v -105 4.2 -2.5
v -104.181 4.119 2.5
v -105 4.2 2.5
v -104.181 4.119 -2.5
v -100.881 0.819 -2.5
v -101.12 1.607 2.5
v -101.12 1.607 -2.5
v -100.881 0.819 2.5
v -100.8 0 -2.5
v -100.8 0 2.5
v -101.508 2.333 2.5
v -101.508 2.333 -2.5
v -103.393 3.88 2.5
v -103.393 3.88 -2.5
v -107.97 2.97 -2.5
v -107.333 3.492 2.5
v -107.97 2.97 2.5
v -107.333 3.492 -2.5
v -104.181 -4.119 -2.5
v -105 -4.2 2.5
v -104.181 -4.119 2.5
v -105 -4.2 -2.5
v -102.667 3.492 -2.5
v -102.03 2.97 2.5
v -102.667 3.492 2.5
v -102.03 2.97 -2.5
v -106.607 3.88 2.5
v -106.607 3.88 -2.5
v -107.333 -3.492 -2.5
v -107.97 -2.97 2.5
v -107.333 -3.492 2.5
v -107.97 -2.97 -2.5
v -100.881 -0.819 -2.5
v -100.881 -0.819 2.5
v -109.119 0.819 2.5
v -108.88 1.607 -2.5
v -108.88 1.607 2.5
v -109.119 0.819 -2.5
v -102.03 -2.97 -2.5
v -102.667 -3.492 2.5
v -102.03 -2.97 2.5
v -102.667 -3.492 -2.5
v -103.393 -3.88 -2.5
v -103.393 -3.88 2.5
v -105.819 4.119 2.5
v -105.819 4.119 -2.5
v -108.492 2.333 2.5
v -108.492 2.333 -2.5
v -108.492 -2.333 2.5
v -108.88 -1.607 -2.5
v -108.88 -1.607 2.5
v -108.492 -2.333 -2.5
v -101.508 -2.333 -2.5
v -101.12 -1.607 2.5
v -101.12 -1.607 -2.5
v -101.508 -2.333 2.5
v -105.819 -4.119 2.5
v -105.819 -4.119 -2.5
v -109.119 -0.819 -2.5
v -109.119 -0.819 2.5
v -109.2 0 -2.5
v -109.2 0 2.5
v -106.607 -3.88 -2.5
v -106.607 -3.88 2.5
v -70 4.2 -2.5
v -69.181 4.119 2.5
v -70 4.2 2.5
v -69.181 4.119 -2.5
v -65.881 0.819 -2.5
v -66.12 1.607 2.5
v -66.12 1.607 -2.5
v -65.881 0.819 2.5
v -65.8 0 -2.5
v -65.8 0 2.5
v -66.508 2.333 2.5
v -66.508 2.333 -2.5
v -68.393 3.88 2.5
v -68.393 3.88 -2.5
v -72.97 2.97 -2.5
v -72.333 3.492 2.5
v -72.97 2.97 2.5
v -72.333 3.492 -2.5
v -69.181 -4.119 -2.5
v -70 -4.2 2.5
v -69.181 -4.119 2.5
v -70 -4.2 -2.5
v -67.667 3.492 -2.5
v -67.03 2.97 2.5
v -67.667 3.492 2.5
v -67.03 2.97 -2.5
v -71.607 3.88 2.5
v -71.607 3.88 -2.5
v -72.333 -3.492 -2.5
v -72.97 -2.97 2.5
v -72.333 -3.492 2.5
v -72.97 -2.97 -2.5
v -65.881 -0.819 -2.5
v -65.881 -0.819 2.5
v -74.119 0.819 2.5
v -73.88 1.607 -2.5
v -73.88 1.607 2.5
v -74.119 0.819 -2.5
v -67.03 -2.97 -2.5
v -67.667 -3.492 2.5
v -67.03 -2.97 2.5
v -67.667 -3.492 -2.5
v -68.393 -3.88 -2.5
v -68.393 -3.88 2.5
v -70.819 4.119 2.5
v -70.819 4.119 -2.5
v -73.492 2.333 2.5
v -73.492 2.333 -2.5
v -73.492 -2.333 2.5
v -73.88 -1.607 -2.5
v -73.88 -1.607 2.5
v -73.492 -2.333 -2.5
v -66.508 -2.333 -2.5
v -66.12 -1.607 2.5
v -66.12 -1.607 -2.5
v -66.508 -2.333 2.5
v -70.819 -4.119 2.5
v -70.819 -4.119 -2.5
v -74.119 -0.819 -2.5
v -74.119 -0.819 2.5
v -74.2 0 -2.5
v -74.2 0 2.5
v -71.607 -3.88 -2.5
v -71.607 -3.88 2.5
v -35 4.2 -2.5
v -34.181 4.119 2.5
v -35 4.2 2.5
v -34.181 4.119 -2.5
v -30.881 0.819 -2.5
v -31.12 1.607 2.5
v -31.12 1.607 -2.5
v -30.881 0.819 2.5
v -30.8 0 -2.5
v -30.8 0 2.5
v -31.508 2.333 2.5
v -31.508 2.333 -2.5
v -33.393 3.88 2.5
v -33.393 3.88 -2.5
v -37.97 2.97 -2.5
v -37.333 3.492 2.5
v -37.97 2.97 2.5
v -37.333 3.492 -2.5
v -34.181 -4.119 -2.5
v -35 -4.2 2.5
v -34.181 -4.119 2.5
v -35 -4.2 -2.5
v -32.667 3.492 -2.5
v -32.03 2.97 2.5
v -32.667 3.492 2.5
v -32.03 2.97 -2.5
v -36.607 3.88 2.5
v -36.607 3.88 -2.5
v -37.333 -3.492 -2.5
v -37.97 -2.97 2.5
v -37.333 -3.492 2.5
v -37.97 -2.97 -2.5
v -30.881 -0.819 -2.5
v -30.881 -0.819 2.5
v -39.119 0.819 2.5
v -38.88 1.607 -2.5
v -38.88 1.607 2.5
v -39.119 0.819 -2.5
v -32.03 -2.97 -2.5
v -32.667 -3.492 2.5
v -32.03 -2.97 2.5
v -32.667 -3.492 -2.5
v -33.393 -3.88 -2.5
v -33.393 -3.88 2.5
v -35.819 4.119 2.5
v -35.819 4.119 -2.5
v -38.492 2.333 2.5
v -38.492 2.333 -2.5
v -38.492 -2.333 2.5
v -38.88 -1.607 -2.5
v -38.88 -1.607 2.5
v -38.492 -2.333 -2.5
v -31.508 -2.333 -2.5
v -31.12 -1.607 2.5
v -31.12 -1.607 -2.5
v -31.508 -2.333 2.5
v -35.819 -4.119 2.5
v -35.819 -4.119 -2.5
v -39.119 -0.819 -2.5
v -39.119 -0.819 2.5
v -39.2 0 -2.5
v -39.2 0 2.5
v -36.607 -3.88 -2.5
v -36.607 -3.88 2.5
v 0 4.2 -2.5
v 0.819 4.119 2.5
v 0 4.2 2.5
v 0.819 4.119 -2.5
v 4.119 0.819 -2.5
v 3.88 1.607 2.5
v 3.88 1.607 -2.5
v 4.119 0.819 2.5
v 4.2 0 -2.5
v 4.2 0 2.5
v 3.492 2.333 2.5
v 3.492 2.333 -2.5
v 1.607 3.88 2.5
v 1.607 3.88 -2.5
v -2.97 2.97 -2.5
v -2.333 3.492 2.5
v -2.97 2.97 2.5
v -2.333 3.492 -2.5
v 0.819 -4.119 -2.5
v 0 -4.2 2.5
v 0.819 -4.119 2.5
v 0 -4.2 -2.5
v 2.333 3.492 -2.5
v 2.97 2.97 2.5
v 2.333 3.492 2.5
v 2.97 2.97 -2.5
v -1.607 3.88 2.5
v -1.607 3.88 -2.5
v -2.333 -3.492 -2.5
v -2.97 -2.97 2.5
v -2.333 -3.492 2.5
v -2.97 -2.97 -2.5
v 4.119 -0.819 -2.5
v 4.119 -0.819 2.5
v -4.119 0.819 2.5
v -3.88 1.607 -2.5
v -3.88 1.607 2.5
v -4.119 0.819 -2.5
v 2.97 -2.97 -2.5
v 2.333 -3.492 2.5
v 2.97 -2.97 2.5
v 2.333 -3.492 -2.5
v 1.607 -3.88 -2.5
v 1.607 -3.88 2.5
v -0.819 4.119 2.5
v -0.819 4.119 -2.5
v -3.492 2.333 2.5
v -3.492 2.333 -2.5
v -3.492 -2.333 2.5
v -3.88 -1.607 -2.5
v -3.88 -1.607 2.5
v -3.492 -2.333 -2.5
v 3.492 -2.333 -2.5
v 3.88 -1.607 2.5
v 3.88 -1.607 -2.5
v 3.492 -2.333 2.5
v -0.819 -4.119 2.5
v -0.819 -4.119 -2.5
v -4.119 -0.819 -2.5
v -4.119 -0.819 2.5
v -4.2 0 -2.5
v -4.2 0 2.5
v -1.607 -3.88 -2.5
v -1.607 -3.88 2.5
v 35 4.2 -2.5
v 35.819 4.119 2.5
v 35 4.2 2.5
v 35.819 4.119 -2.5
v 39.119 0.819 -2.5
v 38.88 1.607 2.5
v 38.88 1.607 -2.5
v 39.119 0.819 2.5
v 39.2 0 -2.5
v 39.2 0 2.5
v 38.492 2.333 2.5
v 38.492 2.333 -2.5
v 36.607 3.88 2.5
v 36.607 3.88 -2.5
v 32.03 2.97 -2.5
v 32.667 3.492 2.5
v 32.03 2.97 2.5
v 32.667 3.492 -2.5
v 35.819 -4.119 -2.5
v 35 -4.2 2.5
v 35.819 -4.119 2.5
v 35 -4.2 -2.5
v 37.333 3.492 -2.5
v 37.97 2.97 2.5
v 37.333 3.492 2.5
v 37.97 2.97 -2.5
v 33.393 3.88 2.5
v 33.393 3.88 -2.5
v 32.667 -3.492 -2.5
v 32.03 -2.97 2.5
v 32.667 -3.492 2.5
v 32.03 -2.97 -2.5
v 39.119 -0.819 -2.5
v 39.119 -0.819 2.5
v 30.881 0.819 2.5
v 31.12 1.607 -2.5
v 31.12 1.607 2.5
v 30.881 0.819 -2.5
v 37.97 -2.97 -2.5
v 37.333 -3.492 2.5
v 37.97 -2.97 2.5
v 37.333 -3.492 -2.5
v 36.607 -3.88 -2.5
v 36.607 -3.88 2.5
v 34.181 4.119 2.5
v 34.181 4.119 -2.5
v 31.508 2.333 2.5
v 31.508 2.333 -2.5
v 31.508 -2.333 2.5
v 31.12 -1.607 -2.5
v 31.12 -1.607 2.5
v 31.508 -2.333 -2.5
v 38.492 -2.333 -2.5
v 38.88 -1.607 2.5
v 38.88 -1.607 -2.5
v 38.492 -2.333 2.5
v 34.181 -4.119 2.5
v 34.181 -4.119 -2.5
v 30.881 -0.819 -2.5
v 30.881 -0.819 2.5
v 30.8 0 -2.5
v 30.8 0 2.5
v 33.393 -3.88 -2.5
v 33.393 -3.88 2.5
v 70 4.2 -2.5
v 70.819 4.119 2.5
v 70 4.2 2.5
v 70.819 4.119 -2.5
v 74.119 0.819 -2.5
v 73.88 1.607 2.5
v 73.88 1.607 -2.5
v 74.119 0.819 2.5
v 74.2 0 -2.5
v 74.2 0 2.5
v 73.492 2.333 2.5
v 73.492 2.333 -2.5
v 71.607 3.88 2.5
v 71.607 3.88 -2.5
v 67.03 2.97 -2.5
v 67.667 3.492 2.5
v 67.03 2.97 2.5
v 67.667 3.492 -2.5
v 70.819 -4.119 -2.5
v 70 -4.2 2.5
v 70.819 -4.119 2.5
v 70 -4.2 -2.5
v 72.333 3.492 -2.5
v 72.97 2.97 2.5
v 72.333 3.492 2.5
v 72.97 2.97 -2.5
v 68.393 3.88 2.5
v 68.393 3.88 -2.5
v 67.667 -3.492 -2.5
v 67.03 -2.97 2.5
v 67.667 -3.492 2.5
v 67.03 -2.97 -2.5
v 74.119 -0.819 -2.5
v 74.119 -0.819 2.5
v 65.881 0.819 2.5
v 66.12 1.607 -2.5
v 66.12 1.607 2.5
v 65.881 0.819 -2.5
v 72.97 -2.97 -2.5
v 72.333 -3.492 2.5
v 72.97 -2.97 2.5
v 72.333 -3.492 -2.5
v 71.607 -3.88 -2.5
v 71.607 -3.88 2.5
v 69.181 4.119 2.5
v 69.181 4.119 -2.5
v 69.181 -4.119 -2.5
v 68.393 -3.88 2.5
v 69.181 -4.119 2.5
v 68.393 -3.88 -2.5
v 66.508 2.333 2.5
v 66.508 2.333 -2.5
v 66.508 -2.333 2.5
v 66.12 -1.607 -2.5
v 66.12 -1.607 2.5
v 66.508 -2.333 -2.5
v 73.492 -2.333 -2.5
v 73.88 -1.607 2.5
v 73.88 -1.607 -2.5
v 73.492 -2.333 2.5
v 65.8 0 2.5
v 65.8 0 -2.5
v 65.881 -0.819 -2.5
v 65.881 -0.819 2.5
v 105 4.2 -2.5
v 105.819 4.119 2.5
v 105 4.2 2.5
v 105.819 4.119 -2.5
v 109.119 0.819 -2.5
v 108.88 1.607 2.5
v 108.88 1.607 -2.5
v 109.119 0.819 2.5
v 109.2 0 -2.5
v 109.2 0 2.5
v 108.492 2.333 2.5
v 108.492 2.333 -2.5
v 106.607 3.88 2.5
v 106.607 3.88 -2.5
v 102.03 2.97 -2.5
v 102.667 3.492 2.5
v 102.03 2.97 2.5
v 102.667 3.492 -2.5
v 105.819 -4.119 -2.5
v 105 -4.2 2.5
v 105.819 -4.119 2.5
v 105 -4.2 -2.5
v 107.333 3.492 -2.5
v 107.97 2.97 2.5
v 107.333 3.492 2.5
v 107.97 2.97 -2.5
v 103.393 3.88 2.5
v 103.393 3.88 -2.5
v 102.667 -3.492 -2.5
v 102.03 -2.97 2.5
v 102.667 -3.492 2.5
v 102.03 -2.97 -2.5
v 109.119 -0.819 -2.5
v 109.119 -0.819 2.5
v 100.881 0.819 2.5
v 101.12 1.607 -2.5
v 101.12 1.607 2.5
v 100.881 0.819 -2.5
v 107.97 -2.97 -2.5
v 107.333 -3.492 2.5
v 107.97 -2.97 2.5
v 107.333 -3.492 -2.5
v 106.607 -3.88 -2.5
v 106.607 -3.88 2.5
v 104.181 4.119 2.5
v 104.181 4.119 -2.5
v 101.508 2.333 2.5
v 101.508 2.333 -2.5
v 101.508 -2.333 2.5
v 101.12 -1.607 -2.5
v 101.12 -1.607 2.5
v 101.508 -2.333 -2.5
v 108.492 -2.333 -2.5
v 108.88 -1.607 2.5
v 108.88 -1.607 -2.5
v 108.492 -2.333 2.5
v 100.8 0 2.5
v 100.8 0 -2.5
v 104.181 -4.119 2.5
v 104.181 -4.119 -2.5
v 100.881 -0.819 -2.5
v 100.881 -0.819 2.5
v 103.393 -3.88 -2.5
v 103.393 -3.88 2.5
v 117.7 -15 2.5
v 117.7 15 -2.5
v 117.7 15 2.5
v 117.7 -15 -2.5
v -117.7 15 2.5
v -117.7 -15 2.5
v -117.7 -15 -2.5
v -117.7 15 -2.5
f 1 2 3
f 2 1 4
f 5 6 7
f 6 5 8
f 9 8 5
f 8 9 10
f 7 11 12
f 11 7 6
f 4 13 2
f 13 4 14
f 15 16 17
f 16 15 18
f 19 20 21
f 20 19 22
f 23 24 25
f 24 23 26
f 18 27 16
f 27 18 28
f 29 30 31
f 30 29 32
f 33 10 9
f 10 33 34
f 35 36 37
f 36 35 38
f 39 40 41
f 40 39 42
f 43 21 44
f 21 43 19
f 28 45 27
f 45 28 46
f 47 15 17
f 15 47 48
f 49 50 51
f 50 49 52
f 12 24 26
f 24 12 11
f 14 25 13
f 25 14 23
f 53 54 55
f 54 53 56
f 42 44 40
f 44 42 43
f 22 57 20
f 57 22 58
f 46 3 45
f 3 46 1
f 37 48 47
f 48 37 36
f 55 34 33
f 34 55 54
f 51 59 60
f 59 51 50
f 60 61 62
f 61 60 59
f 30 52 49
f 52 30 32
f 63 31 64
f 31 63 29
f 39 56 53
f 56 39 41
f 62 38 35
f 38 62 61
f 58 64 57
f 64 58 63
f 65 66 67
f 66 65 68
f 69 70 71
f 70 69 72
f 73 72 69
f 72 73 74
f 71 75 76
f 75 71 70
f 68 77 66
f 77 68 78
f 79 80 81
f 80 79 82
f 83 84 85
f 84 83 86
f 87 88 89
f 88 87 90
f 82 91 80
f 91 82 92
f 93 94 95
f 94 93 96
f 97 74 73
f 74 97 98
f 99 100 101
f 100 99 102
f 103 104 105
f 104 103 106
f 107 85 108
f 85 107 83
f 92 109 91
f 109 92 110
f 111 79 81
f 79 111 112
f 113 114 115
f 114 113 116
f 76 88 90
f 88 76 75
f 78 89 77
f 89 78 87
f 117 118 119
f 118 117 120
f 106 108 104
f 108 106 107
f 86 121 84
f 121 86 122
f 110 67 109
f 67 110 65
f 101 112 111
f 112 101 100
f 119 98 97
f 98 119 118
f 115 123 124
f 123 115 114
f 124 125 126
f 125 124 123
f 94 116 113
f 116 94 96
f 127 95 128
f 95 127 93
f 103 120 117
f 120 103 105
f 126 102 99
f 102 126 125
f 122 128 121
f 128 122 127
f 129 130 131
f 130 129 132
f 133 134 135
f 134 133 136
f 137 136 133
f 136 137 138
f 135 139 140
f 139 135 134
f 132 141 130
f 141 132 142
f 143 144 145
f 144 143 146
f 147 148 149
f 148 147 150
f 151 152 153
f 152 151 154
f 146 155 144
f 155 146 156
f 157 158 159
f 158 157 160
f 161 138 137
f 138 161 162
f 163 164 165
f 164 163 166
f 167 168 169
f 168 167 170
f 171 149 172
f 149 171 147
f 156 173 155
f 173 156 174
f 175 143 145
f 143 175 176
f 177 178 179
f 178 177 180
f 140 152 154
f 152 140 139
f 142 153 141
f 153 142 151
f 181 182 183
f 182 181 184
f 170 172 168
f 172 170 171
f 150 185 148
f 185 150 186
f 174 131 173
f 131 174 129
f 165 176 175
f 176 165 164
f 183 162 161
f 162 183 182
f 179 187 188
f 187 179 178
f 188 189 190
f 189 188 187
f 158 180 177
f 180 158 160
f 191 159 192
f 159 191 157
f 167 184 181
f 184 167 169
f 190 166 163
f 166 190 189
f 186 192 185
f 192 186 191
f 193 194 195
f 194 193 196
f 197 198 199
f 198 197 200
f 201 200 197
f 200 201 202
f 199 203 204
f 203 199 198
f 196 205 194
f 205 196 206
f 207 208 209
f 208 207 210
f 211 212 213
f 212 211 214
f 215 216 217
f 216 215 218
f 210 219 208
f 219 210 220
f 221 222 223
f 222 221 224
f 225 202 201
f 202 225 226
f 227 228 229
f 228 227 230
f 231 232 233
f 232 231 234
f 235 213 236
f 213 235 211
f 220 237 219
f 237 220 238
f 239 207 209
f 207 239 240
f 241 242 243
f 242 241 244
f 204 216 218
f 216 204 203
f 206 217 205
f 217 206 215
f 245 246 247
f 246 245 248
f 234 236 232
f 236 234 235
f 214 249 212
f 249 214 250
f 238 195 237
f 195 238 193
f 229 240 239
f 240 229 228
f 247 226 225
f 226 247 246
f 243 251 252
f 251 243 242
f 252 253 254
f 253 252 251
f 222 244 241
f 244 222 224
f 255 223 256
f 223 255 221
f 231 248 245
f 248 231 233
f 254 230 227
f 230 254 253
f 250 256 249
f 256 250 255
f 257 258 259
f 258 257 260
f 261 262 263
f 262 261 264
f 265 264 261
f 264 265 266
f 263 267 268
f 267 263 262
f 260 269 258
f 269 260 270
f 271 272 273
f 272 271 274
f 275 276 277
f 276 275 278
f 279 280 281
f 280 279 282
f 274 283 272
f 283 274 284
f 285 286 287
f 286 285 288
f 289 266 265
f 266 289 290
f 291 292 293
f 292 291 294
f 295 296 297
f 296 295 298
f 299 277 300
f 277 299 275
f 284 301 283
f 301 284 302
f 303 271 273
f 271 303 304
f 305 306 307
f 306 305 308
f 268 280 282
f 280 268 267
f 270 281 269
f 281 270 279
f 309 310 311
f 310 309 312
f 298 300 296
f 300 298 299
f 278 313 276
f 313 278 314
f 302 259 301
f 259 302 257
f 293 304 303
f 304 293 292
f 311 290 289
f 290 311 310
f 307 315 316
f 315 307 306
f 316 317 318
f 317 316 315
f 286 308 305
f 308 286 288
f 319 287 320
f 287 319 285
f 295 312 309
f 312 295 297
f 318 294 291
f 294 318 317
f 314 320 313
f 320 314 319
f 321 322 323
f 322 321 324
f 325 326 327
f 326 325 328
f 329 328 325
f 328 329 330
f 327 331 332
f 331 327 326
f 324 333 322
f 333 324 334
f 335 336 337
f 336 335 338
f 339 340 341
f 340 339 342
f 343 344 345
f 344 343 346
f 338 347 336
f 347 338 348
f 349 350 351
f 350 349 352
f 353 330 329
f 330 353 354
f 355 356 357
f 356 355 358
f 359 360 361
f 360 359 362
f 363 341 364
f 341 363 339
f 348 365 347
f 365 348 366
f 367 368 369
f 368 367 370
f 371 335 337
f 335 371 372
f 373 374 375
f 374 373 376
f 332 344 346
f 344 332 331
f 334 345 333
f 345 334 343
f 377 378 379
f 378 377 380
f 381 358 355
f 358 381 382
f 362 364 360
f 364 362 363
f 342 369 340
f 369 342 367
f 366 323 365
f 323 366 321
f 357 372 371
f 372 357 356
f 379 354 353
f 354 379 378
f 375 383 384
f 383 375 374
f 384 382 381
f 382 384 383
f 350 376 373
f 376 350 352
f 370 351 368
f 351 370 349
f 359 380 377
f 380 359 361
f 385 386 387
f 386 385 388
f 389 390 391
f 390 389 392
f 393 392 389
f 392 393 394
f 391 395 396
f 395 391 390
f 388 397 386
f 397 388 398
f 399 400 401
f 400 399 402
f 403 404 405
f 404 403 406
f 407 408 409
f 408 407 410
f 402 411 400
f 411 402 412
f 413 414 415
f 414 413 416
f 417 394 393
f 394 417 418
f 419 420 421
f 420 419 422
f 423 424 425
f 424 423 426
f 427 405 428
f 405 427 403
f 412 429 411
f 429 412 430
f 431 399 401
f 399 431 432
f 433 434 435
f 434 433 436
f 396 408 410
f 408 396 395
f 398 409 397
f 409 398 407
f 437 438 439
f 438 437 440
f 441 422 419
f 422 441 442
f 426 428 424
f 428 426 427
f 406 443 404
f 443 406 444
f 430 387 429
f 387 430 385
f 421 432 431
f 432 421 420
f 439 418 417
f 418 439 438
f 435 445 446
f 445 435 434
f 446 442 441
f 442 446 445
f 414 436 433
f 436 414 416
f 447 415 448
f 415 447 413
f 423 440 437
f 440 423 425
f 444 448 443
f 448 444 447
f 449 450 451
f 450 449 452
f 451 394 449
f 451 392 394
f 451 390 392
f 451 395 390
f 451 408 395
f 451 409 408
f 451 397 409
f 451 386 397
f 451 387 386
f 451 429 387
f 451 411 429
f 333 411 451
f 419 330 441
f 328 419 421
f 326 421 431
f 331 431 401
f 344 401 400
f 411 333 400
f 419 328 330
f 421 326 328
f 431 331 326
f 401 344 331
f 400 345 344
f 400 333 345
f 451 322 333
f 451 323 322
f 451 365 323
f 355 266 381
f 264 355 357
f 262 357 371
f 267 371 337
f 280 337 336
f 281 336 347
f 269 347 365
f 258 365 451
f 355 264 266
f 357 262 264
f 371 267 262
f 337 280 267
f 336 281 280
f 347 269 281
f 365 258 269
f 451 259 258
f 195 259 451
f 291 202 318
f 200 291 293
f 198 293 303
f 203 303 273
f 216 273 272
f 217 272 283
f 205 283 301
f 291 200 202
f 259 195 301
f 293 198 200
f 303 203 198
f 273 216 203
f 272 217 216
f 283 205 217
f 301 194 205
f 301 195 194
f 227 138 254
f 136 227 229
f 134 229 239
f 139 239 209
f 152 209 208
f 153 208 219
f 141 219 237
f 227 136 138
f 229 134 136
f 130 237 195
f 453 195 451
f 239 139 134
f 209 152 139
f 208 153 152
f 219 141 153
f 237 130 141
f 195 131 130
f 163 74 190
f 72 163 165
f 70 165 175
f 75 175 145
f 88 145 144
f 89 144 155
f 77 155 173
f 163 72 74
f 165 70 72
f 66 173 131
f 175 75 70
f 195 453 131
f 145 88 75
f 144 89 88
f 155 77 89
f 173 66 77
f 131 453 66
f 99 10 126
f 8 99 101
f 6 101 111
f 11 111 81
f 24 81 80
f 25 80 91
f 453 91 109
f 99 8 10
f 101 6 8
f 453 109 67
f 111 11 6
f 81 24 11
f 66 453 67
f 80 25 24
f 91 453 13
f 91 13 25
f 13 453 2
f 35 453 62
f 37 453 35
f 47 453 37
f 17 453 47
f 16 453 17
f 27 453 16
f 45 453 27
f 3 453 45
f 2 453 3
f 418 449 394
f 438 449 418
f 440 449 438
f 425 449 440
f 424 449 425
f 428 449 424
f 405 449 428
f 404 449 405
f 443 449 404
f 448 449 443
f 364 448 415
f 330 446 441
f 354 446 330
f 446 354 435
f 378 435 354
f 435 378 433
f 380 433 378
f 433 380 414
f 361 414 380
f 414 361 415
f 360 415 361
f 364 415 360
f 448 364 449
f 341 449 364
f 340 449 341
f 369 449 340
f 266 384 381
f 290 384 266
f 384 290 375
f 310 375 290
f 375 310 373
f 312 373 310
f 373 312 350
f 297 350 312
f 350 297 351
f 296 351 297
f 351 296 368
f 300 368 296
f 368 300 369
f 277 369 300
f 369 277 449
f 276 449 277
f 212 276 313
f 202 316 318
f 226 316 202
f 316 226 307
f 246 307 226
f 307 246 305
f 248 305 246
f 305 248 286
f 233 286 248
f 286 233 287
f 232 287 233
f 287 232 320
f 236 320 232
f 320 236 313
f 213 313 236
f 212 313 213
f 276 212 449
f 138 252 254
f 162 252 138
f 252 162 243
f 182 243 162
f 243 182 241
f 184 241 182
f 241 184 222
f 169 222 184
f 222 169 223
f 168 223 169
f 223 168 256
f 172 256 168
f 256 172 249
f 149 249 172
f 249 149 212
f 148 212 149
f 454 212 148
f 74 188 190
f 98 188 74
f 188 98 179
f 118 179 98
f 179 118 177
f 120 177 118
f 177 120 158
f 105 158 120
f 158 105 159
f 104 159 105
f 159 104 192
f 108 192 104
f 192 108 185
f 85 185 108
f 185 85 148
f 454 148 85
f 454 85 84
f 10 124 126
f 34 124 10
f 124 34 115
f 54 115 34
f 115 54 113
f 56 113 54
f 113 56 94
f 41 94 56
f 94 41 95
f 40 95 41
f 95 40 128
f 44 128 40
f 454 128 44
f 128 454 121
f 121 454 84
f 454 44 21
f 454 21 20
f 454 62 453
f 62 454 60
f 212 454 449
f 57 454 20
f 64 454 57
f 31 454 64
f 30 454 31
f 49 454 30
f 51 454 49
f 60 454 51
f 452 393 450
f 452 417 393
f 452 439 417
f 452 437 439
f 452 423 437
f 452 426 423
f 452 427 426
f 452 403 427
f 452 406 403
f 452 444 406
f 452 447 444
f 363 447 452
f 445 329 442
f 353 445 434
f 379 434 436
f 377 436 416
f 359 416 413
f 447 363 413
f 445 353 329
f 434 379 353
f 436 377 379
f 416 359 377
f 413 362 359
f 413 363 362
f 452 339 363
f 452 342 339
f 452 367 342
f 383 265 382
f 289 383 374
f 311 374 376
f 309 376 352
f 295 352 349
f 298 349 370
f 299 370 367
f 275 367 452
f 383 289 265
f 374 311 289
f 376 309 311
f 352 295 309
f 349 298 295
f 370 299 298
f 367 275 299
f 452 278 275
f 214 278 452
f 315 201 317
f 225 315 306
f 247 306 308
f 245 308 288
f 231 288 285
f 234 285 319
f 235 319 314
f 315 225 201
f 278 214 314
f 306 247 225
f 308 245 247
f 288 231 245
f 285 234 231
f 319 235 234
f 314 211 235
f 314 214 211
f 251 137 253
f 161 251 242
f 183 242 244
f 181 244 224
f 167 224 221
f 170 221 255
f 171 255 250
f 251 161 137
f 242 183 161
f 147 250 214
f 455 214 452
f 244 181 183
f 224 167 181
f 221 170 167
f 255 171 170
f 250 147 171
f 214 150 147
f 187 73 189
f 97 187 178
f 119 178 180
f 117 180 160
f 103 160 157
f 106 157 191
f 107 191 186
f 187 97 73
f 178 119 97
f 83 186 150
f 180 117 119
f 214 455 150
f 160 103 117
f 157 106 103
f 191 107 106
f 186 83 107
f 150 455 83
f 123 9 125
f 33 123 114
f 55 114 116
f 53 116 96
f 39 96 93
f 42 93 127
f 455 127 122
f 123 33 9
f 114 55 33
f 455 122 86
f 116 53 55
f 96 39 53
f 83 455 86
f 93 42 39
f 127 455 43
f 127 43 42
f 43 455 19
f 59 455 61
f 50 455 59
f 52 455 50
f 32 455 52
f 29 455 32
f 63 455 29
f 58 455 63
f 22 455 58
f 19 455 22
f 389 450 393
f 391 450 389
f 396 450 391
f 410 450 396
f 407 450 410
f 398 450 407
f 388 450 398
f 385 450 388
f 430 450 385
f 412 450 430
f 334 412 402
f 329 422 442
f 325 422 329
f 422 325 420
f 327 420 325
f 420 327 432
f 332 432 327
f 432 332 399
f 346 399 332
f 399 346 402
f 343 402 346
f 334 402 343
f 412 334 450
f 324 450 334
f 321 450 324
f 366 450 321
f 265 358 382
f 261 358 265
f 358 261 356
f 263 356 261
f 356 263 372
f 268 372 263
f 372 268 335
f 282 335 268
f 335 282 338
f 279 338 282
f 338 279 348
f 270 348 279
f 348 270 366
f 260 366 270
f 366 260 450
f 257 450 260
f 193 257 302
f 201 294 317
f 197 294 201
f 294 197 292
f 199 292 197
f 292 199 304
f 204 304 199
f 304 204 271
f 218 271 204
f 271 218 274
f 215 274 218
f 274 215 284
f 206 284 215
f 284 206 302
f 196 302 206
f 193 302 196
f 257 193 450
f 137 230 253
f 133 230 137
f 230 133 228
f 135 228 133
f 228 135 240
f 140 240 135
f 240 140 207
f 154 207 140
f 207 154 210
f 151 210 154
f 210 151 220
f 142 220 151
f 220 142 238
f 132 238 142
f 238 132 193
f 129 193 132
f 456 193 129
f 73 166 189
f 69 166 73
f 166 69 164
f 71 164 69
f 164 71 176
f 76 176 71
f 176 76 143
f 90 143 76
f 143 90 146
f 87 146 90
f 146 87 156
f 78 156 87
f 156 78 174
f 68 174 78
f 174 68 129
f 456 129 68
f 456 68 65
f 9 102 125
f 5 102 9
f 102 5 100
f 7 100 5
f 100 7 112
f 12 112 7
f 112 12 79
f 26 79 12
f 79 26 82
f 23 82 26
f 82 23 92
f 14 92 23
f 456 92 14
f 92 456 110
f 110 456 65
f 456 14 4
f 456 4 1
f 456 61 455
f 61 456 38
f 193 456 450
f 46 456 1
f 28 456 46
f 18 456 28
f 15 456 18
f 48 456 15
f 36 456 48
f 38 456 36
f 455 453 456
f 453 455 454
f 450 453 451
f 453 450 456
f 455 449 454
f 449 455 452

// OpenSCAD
$fn = 32;

// ----------------------------------------------------------------------
// Hole bar, 7 x Ø8.4
// row layout, 12.7 mm edge offset
// ----------------------------------------------------------------------

// --- parameters (mm) ---
bar_w = 30;    // bar width (Y)
bar_t = 5;     // bar thickness (Z)
holes = 7;     // holes per row
hole_d = 8.4;  // hole diameter
edge = 12.7;   // offset from the bar end to the first hole
pitch = 35;    // pitch between neighbouring holes

// --- derived feature positions (mm) ---
span = (holes - 1) * pitch;   // = 210   distance between the end holes
bar_l = span + 2 * edge;      // = 235.4   overall bar length
start_x = -bar_l / 2 + edge;  // = -105   X of the first hole
feature_centers = [
  [start_x + 0 * pitch, 0],
  [start_x + 1 * pitch, 0],
  [start_x + 2 * pitch, 0],
  [start_x + 3 * pitch, 0],
  [start_x + 4 * pitch, 0],
  [start_x + 5 * pitch, 0],
  [start_x + 6 * pitch, 0]
];   // hole centres of the first row

// bar with one row of holes, drilled from feature_centers
difference() {
  translate([-bar_l / 2, -bar_w / 2, -bar_t / 2]) cube([bar_l, bar_w, bar_t]);
  for (centre = feature_centers)
    translate([centre[0], centre[1], 0])
      cylinder(d = hole_d, h = bar_t + 2, center = true);
}
